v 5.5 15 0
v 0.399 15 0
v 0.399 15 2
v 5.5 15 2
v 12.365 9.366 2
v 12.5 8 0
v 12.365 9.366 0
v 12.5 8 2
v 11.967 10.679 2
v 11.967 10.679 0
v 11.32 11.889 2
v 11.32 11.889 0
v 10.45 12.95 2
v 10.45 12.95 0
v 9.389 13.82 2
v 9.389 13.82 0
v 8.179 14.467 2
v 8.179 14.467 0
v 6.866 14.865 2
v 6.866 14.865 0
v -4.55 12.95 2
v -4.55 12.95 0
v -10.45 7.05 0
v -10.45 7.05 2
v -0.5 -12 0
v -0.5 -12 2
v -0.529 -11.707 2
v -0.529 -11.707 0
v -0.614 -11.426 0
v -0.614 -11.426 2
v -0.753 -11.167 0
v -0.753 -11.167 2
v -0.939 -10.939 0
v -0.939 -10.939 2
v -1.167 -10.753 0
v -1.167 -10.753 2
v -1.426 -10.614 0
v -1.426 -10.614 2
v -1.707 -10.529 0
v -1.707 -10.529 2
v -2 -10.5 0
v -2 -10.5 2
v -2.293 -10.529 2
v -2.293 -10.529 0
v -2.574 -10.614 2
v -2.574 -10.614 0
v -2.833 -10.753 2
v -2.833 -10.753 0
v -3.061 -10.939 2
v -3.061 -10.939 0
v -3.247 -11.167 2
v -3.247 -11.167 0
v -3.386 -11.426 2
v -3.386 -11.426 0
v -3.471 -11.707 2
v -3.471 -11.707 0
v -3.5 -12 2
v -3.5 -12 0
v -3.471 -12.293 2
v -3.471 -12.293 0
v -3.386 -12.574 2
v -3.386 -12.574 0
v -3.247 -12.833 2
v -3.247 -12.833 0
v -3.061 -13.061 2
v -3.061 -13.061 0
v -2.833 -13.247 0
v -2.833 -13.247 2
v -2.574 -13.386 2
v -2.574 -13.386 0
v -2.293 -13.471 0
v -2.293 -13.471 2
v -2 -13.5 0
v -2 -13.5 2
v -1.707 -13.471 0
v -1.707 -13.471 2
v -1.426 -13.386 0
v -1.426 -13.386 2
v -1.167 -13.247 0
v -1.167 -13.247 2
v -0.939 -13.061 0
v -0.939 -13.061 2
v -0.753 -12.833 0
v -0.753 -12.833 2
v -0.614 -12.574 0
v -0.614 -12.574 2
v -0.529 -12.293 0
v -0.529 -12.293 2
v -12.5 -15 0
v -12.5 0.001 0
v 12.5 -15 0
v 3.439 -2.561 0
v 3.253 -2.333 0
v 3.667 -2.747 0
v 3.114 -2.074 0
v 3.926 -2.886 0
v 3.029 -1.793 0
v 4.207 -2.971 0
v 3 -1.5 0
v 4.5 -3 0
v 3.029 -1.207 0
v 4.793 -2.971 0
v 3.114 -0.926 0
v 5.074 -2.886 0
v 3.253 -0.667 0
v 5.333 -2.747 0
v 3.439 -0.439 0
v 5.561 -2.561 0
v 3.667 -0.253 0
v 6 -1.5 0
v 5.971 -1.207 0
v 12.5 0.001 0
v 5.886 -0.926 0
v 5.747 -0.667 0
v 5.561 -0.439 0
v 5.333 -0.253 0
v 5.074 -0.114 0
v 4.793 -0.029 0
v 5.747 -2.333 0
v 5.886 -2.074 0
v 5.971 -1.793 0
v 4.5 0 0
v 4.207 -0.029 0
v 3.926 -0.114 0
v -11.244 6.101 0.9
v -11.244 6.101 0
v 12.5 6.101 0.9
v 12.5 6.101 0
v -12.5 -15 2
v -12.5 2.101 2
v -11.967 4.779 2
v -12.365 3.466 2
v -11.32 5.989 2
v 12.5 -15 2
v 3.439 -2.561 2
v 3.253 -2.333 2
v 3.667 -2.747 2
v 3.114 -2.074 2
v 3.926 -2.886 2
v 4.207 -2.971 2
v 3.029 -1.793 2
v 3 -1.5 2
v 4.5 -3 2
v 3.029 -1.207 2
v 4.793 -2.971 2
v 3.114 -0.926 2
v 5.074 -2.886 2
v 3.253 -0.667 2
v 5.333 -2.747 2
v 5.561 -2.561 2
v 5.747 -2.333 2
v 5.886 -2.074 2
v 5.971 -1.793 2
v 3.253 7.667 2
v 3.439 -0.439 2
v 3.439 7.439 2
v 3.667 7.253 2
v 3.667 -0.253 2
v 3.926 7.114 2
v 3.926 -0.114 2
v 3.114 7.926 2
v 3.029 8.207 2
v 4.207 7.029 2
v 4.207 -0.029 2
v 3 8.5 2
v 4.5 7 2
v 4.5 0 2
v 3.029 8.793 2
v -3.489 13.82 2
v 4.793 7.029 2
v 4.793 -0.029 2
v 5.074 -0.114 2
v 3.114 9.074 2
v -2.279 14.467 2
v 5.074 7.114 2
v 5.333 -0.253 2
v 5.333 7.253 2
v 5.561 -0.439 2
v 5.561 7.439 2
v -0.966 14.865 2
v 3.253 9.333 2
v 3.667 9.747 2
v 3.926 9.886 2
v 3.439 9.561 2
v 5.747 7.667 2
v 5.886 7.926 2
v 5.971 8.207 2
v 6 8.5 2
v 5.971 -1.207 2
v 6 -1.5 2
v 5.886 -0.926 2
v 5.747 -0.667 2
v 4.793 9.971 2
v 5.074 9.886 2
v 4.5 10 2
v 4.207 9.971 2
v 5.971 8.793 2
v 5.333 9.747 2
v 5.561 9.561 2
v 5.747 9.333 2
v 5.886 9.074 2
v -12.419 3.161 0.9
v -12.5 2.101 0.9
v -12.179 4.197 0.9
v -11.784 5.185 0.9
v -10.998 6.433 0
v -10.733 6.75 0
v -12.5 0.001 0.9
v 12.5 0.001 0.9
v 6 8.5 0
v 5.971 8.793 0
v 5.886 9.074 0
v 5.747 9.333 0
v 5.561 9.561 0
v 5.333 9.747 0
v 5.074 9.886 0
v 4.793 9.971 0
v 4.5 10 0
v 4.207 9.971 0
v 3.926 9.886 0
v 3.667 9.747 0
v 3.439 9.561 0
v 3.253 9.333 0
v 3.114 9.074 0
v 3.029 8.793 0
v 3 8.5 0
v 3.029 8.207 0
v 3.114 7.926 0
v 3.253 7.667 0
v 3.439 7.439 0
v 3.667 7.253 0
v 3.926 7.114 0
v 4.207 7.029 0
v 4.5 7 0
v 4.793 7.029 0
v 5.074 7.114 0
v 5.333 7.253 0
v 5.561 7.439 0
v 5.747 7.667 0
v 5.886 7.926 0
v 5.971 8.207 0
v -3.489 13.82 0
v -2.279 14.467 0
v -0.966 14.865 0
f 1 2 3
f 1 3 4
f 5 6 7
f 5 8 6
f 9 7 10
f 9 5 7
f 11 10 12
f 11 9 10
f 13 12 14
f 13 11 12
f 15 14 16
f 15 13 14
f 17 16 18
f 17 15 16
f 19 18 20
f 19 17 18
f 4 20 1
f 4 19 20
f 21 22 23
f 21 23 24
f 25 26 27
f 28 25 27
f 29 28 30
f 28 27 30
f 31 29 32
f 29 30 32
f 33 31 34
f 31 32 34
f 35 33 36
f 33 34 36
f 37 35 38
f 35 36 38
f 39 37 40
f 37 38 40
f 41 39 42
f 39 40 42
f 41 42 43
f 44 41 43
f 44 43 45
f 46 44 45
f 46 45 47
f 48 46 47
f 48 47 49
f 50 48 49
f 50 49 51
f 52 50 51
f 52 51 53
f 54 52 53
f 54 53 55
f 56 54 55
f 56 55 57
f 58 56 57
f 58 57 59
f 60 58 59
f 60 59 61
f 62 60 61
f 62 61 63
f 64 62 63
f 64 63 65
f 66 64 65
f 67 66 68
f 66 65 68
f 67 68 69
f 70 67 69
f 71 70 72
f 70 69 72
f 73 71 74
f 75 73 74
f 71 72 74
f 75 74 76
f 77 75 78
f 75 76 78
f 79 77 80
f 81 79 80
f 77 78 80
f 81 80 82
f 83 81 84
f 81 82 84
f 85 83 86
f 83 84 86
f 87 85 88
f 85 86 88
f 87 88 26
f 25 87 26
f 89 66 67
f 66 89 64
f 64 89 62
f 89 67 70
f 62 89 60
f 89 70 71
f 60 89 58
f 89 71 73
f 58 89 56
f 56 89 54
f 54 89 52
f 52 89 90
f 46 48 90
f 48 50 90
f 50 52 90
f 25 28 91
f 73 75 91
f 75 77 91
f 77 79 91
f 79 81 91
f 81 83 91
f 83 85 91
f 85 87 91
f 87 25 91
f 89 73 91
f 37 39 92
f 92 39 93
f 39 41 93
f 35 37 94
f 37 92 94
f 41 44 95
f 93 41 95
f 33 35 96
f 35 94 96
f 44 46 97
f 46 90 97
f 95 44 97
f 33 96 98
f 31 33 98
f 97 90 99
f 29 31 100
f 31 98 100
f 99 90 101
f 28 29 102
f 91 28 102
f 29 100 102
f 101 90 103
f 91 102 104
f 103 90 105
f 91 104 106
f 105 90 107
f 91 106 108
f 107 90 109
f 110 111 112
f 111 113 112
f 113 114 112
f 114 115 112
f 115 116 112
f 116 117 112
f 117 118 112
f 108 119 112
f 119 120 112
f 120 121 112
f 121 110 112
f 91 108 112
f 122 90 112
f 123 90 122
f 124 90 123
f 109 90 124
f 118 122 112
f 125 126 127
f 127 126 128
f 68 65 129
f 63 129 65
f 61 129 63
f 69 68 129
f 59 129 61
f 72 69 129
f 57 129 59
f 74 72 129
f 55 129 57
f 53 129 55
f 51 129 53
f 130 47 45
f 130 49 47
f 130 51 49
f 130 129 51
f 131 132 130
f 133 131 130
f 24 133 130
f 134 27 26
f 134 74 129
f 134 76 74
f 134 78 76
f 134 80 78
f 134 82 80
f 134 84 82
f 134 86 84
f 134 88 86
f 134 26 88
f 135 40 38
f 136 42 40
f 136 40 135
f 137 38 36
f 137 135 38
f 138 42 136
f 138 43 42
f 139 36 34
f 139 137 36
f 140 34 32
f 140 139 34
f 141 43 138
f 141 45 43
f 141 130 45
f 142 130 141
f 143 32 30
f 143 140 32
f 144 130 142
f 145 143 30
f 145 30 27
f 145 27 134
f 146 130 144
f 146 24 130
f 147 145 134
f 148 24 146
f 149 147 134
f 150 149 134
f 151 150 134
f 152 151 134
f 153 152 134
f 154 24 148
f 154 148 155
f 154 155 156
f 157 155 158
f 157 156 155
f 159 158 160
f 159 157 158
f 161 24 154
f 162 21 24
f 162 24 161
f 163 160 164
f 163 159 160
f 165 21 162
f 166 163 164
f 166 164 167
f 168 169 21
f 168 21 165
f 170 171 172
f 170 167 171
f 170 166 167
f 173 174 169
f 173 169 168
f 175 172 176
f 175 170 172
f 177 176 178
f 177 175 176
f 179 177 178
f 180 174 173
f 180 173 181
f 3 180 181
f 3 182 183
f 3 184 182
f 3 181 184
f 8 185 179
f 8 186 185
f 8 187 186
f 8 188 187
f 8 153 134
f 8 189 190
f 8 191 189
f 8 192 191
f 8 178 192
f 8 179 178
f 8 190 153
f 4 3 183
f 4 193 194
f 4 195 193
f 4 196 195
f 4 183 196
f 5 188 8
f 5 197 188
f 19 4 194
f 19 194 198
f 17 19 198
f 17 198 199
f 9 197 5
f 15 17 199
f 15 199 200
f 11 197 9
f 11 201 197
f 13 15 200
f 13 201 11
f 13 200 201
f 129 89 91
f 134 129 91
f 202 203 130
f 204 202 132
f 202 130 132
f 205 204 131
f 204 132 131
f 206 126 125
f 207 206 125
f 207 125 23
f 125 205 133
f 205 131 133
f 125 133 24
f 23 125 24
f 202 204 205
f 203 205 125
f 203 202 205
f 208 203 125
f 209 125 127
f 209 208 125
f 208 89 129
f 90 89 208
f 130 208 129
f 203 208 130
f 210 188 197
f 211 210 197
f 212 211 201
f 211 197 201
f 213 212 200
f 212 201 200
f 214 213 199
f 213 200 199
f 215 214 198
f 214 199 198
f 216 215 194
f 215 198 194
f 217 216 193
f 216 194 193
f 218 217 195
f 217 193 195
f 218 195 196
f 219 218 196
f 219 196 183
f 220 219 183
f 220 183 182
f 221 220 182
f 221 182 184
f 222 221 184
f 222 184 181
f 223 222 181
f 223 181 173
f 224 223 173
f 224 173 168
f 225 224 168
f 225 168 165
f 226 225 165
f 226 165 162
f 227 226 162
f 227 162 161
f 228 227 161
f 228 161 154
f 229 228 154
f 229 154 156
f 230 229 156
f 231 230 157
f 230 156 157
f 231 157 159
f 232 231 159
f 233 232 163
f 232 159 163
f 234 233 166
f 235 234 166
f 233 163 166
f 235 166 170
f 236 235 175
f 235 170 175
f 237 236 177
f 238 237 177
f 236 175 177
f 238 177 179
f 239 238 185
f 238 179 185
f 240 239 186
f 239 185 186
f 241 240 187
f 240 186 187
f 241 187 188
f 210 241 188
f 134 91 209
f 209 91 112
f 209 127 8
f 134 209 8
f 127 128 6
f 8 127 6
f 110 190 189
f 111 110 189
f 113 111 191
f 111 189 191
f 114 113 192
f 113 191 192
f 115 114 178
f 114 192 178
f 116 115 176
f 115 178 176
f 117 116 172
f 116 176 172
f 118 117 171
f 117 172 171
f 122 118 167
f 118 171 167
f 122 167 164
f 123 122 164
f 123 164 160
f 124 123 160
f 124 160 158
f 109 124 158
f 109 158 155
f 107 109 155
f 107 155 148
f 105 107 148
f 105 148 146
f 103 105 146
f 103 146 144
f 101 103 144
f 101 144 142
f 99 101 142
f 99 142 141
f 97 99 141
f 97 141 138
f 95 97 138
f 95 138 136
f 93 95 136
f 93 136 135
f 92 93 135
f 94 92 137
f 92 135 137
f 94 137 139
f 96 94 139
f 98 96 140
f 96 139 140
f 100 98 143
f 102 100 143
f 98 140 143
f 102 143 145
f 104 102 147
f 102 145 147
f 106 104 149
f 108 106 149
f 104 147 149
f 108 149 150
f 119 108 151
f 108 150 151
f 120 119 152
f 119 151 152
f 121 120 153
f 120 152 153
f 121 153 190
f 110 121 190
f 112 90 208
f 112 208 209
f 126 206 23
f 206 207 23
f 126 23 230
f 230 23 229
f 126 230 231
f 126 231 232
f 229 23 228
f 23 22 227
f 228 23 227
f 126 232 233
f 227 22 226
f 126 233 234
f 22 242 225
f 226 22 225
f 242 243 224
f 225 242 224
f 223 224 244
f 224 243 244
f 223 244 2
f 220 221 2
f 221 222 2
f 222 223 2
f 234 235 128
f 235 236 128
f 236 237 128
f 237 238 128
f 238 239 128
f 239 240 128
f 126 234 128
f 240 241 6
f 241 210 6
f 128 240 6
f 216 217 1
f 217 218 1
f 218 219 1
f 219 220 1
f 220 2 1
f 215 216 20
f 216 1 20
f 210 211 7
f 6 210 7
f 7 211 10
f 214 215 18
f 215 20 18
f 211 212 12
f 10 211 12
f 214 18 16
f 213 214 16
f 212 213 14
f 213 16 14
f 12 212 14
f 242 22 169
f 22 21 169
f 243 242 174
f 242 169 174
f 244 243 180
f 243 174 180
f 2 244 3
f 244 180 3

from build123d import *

# Parameters (mm, degrees)
F0_W     = 25
F0_H     = 30
F1_DEPTH = 2
F2_R     = 1.5
F3_DEPTH = 2.001
F4_W     = 25
F4_H     = 6.1
F5_DEPTH = 0.9
F6_SIZE  = 10
F7_R     = 7


with BuildPart() as f1:
    # F0 (on Top) → F1 (new body)
    with BuildSketch(Plane.XY):
        Rectangle(F0_W, F0_H)
    extrude(amount=F1_DEPTH)

    # F2 (on face) → F3 (cut, through all)
    with BuildSketch(Plane.XY.offset(2)):
        with Locations((-2, -12)):
            Circle(F2_R)
        with Locations((4.5, -1.5)):
            Circle(F2_R)
        with Locations((4.5, 8.5)):
            Circle(F2_R)
    extrude(amount=-F3_DEPTH, mode=Mode.SUBTRACT)

    # F4 (on face) → F5 (cut)
    with BuildSketch(Plane(origin=(0, 0, 0), x_dir=(1, 0, 0), z_dir=(0, 0, -1))):
        with Locations((0, -3.051)):
            Rectangle(F4_W, F4_H)
    extrude(amount=-F5_DEPTH, mode=Mode.SUBTRACT)

    # F6
    f6_edges = [f1.edges().sort_by_distance(p)[0] for p in [
        (-12.5, 15, 1),
    ]]
    chamfer(f6_edges, length=F6_SIZE)

    # F7
    f7_edges = [f1.edges().sort_by_distance(p)[0] for p in [
        (-12.5, 5, 1.45),
        (-2.5, 15, 1),
        (12.5, 15, 1),
    ]]
    fillet(f7_edges, radius=F7_R)


solid = f1.part
